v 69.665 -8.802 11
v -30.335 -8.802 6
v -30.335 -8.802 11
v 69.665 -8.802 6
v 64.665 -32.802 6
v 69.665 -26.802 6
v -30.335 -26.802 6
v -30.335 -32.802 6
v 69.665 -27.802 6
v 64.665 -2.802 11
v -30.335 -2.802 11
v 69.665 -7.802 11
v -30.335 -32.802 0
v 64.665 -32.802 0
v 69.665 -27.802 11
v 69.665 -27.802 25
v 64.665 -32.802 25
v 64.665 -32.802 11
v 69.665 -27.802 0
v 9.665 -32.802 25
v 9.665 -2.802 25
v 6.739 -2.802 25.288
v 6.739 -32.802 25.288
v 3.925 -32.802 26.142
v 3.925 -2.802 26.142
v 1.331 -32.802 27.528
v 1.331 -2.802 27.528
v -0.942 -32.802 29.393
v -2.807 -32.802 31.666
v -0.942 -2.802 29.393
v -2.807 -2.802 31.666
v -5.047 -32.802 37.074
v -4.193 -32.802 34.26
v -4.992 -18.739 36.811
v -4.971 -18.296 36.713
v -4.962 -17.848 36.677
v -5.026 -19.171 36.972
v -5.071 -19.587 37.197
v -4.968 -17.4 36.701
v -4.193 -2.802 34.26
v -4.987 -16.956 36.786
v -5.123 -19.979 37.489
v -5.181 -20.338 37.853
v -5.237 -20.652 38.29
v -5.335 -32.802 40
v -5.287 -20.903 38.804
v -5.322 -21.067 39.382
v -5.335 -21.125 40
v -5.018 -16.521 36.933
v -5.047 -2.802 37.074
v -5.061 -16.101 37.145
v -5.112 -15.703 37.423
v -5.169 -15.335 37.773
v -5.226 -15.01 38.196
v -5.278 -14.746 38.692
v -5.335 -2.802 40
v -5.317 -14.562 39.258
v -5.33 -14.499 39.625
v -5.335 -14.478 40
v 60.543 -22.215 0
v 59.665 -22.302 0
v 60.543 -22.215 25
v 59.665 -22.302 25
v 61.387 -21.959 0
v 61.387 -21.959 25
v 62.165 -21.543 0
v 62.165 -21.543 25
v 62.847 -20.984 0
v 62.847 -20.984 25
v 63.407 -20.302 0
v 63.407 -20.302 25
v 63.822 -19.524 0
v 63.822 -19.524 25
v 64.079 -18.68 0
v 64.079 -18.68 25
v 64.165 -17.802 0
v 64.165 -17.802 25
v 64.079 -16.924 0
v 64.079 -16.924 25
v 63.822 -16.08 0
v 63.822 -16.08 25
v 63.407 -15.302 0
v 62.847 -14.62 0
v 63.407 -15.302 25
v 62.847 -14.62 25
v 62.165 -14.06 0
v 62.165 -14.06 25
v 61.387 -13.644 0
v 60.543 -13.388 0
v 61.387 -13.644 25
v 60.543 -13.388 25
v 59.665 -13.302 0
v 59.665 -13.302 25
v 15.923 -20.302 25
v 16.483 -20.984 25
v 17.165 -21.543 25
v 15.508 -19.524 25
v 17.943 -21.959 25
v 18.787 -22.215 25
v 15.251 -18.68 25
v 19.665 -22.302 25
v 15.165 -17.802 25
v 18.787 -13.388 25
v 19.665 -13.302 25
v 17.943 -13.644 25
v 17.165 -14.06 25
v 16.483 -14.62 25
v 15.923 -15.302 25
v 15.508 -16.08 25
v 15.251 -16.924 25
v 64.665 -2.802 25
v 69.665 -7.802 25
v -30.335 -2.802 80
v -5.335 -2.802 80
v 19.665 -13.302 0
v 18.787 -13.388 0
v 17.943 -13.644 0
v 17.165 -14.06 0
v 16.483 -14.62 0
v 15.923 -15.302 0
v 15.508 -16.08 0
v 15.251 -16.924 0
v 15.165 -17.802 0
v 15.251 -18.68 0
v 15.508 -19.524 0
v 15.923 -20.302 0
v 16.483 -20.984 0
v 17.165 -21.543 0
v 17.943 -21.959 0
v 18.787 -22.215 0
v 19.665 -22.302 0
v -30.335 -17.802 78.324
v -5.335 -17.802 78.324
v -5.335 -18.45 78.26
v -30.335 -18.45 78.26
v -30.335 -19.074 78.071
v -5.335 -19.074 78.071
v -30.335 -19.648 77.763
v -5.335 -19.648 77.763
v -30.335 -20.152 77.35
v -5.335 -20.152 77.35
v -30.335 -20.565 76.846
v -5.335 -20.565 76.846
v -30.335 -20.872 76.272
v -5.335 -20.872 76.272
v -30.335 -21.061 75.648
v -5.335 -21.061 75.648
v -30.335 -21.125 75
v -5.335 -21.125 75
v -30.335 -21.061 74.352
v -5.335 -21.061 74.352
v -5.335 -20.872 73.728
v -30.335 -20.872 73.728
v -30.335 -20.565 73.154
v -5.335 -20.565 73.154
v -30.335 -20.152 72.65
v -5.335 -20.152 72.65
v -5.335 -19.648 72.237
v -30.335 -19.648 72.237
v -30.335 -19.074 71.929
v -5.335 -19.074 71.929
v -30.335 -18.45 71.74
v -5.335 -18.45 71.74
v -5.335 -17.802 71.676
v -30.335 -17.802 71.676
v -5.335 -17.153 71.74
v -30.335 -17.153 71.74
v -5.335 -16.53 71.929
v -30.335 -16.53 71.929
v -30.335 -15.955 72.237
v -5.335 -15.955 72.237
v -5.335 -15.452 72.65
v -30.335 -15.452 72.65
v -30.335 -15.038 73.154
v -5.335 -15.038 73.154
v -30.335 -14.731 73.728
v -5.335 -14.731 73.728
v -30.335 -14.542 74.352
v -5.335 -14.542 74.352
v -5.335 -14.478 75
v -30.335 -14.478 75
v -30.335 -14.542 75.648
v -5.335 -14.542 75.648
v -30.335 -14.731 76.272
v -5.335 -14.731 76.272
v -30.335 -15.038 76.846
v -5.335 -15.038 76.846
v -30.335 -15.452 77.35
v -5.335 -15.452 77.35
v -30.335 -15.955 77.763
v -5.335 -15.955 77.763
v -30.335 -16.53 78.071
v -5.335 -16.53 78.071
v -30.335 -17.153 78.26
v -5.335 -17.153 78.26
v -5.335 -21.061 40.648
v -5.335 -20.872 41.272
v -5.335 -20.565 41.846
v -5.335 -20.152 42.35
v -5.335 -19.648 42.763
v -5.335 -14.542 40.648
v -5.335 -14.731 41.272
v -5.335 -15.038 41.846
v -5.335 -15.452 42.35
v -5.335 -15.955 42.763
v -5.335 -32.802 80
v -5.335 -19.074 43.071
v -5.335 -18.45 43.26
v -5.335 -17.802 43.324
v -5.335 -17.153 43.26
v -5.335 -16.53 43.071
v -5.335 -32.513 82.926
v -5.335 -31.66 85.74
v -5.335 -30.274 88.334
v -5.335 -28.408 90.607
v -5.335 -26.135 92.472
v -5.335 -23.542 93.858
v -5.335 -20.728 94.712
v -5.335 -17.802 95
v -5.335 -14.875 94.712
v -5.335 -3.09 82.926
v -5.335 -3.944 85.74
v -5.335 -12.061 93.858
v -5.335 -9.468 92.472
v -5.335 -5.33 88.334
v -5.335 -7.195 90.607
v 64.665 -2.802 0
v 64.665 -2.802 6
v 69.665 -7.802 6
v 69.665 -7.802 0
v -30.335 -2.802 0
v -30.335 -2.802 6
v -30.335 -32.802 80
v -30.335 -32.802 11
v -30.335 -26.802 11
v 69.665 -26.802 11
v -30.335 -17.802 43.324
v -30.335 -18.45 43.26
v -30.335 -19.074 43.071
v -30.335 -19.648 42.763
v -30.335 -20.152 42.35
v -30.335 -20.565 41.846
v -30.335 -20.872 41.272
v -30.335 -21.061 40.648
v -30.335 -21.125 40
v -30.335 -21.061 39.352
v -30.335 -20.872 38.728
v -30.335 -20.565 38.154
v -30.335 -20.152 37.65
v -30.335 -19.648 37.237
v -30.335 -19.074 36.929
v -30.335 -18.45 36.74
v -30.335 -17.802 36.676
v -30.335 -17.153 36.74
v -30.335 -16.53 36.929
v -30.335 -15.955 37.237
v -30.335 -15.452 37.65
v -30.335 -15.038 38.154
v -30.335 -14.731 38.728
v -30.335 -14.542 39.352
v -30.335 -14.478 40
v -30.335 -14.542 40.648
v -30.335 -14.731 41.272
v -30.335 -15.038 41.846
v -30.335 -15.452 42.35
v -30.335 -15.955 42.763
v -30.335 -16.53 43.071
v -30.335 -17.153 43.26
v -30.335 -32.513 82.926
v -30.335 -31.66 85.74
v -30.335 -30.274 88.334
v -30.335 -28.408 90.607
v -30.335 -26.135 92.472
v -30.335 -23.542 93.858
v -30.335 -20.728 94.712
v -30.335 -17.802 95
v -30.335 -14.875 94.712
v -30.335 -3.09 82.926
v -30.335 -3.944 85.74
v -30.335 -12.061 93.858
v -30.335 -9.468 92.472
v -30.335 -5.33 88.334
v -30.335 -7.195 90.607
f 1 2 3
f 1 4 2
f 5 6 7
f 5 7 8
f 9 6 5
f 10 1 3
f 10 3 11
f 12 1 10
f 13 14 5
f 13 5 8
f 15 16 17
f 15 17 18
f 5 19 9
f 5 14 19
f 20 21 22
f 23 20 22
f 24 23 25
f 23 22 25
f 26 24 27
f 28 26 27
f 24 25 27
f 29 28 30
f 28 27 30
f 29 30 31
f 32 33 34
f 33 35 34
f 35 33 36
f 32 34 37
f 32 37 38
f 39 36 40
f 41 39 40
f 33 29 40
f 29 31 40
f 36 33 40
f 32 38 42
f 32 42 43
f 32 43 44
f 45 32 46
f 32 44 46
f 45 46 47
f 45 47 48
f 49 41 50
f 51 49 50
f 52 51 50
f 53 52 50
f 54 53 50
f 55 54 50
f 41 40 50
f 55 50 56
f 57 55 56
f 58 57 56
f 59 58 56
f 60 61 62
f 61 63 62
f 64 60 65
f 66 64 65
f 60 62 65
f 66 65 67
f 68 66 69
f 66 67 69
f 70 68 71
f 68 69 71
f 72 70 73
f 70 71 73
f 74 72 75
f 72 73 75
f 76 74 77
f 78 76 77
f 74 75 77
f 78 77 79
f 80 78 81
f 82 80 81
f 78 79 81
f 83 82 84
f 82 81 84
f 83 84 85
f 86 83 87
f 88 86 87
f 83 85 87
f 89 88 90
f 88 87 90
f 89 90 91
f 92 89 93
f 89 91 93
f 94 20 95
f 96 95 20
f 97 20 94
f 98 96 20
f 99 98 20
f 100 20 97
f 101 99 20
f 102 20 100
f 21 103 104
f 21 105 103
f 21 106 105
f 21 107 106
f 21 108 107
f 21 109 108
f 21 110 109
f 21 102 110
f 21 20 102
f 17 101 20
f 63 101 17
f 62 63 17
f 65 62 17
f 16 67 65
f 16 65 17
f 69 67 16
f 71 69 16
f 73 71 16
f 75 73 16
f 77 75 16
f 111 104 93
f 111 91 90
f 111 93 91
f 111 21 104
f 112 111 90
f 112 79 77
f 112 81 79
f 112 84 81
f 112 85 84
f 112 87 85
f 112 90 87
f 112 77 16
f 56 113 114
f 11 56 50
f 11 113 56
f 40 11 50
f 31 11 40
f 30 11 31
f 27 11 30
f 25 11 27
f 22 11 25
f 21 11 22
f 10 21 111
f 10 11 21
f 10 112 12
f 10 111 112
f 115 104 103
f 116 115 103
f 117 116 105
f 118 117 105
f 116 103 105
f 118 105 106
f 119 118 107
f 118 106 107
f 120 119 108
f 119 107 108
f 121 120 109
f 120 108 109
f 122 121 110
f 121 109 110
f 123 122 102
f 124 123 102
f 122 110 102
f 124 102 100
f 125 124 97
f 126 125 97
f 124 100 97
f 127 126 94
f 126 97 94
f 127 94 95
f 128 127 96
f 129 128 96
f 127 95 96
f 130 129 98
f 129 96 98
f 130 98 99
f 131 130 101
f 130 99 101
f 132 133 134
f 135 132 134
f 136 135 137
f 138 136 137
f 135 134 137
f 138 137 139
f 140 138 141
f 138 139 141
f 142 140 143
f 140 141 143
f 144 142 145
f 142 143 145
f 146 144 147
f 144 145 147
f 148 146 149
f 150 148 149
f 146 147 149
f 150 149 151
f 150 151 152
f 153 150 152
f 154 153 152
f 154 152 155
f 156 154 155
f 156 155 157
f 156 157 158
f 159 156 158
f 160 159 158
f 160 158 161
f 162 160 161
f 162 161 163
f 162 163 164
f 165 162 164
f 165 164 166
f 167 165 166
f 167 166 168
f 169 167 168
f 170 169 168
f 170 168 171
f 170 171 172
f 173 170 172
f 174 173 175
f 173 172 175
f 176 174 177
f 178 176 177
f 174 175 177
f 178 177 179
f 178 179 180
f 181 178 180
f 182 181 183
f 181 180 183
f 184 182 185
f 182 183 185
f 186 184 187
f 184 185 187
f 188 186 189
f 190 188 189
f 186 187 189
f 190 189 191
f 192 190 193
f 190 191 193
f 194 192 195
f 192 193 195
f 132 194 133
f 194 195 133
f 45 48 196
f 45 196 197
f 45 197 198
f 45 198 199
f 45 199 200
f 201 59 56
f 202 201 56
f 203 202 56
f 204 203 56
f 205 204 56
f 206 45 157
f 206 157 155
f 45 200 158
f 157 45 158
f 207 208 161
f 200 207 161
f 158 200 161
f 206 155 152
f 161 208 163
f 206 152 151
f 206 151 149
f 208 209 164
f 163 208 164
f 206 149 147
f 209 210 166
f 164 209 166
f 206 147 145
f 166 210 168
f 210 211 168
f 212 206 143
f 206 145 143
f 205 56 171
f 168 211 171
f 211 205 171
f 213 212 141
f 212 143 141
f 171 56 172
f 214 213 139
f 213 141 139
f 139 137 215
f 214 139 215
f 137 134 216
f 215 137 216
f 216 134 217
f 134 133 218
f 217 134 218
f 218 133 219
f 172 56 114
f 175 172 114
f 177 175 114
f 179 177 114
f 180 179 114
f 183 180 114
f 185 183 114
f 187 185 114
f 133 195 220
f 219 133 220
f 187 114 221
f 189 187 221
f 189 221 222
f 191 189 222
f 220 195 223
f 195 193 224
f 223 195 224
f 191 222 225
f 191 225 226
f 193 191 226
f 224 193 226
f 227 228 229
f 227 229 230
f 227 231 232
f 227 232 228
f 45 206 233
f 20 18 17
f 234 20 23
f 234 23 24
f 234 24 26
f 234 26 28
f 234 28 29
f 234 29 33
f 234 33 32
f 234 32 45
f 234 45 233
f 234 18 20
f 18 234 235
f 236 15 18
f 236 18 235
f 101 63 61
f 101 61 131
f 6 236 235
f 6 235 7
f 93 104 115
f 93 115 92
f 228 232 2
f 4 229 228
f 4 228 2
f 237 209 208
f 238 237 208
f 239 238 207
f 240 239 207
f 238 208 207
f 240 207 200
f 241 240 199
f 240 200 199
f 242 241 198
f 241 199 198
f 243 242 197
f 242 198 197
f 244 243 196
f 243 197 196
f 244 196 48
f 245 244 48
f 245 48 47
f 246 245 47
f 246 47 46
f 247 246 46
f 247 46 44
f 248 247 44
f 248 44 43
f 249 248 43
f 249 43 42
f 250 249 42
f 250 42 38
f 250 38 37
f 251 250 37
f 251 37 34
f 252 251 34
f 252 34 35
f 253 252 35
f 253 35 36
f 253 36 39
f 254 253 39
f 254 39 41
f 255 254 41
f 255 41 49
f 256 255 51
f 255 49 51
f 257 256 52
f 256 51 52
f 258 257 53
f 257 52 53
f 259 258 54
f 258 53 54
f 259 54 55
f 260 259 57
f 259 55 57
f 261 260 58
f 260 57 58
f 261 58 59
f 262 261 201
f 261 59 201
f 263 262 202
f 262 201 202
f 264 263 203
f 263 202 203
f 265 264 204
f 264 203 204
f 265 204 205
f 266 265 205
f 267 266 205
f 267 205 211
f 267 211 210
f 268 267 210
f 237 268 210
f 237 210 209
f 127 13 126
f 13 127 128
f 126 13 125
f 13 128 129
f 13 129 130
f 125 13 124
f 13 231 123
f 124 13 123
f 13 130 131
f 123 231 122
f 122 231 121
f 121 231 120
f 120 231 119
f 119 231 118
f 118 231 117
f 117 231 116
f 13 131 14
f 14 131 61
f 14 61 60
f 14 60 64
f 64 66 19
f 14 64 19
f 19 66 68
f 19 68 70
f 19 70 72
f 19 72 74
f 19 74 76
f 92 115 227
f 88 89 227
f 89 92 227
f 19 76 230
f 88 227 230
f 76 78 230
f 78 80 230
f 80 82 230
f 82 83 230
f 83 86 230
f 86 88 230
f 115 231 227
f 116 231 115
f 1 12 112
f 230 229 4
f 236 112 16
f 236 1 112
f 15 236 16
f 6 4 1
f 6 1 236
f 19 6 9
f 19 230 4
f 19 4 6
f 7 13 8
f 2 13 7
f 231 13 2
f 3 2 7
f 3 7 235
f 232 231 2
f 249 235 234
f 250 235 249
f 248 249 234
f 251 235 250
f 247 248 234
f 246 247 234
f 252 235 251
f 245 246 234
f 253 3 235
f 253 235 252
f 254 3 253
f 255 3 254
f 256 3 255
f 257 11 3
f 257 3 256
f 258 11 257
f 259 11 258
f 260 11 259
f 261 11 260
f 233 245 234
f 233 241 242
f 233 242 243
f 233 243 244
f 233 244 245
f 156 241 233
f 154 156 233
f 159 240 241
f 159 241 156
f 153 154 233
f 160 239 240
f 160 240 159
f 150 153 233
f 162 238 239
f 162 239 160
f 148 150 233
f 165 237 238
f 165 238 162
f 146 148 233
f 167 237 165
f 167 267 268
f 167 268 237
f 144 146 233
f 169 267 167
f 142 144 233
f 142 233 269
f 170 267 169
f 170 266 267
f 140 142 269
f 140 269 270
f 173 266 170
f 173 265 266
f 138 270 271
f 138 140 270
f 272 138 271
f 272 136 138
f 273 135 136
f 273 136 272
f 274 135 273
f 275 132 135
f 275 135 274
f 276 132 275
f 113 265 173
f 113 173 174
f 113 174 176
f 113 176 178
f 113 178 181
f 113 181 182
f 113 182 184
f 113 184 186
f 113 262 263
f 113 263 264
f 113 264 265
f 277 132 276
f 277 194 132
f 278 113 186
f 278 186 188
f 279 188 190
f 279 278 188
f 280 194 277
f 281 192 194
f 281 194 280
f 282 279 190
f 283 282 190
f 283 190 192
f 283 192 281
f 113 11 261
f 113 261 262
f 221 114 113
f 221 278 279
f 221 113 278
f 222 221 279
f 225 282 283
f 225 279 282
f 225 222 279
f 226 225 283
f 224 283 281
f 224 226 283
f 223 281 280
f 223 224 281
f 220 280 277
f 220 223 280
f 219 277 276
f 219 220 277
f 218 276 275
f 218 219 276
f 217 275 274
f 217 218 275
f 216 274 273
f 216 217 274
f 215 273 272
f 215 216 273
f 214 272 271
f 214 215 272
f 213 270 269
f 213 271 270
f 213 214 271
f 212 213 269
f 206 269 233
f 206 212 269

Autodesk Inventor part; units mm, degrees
ref_plane "YZ Plane" through (0, 0, 0) normal (1, 0, 0) x (0, 1, 0)
ref_plane "XZ Plane" through (0, 0, 0) normal (0, 1, 0) x (-1, 0, 0)
sketch "Sketch2" plane through (0, 0, 0) normal (0, 0, 1) x (1, 0, 0)
  line L0 (-5.335, -2.8017) -> (69.665, -2.8017)
  line L1 (69.665, -2.8017) -> (69.665, -32.8017)
  line L2 (69.665, -32.8017) -> (-5.335, -32.8017)
  line L3 (-5.335, -32.8017) -> (-5.335, -2.8017)
  dimension "d0" = 30
  dimension "d1" = 75
extrude "Extrusion1" add sketch "Sketch2" along normal blind 25
sketch "Sketch3" plane through (-5.335, -32.8017, 0) normal (-1, 0, 0) x (0, 0, 1)
  line L0 (25, 0) -> (25, 30) projected
  line L1 (0, 30) -> (25, 30) projected
  line L2 (0, 0) -> (0, 30) projected
  line L3 (0, 0) -> (25, 0) projected
  line L4 (25, 30) -> (80, 30)
  arc A0 (80, 0) -> (80, 30) centre (80, 15) ccw
  line L5 (80, 0) -> (25, 0)
  dimension "d15" = 80
extrude "Extrusion2" add sketch "Sketch3" along normal blind 25
sketch "Sketch5" plane through (69.665, -32.8017, 0) normal (1, 0, 0) x (0, 0, -1)
  line L0 (0, 0) -> (-25, 0) projected
  line L1 (0, 30) -> (0, 0) projected
  line L2 (-6, 0) -> (-11, 0)
  line L3 (-11, 0) -> (-11, 6)
  line L4 (-11, 6) -> (-6, 6)
  line L5 (-6, 6) -> (-6, 0)
  dimension "d16" = 5
  dimension "d17" = 6
  dimension "d18" = 6
extrude "Extrusion4" cut sketch "Sketch5" against normal through all
ref_plane "Work Plane1" through (-5.335, -17.8017, 25) normal (0, -1, 0) x (1, 0, 0)
mirror "Mirror1" about plane through (-5.335, -17.8017, 25) normal (0, -1, 0) of "Extrusion4"
fillet "Fillet1" radius 15 1 edges at (-5.335, -17.8017, 25)
sketch "Sketch4" plane through (0, 0, 25) normal (0, 0, 1) x (1, 0, 0)
  line L0 (19.665, -13.3017) -> (59.665, -13.3017)
  arc A0 (59.665, -22.3017) -> (59.665, -13.3017) centre (59.665, -17.8017) ccw
  line L1 (59.665, -22.3017) -> (19.665, -22.3017)
  arc A1 (19.665, -13.3017) -> (19.665, -22.3017) centre (19.665, -17.8017) ccw
  line L2 (-30.335, -32.8017) -> (-30.335, -2.8017) projected
  line L3 (69.665, -32.8017) -> (9.665, -32.8017) projected
  line L4 (69.665, -2.8017) -> (69.665, -32.8017) projected
  dimension "d10" = 4.5
  dimension "d12" = 50
  dimension "d21" = 15
  dimension "d22" = 10
extrude "Extrusion3" cut sketch "Sketch4" against normal through all
chamfer "Chamfer2" distance 5 angle 45 4 edges at (69.665, -2.8017, 18) (69.665, -32.8017, 18) (69.665, -2.8017, 3) (69.665, -32.8017, 3)
sketch "Sketch9" plane through (-30.335, -32.8017, 0) normal (-1, 0, 0) x (0, 0, 1)
  line L0 (0, 0) -> (0, 30) projected
  line L1 (80, 0) -> (11, 0) projected
  point P0 (75, 15)
  point P1 (40, 15)
  dimension "d50" = 15
  dimension "d51" = 75
  dimension "d52" = 40
hole "Hole4" at (-30.335, -17.8017, 75) at (-30.335, -17.8017, 40) direction (1, 0, 0) diameter 6.647 end through all thread size "M8x1.25" class "6H" standard "ISO Metric profile"
equation "\"d21\" = 0.5 * d0"
equation "\"d50\" = 0.5 * d0"
properties part number "100006"
